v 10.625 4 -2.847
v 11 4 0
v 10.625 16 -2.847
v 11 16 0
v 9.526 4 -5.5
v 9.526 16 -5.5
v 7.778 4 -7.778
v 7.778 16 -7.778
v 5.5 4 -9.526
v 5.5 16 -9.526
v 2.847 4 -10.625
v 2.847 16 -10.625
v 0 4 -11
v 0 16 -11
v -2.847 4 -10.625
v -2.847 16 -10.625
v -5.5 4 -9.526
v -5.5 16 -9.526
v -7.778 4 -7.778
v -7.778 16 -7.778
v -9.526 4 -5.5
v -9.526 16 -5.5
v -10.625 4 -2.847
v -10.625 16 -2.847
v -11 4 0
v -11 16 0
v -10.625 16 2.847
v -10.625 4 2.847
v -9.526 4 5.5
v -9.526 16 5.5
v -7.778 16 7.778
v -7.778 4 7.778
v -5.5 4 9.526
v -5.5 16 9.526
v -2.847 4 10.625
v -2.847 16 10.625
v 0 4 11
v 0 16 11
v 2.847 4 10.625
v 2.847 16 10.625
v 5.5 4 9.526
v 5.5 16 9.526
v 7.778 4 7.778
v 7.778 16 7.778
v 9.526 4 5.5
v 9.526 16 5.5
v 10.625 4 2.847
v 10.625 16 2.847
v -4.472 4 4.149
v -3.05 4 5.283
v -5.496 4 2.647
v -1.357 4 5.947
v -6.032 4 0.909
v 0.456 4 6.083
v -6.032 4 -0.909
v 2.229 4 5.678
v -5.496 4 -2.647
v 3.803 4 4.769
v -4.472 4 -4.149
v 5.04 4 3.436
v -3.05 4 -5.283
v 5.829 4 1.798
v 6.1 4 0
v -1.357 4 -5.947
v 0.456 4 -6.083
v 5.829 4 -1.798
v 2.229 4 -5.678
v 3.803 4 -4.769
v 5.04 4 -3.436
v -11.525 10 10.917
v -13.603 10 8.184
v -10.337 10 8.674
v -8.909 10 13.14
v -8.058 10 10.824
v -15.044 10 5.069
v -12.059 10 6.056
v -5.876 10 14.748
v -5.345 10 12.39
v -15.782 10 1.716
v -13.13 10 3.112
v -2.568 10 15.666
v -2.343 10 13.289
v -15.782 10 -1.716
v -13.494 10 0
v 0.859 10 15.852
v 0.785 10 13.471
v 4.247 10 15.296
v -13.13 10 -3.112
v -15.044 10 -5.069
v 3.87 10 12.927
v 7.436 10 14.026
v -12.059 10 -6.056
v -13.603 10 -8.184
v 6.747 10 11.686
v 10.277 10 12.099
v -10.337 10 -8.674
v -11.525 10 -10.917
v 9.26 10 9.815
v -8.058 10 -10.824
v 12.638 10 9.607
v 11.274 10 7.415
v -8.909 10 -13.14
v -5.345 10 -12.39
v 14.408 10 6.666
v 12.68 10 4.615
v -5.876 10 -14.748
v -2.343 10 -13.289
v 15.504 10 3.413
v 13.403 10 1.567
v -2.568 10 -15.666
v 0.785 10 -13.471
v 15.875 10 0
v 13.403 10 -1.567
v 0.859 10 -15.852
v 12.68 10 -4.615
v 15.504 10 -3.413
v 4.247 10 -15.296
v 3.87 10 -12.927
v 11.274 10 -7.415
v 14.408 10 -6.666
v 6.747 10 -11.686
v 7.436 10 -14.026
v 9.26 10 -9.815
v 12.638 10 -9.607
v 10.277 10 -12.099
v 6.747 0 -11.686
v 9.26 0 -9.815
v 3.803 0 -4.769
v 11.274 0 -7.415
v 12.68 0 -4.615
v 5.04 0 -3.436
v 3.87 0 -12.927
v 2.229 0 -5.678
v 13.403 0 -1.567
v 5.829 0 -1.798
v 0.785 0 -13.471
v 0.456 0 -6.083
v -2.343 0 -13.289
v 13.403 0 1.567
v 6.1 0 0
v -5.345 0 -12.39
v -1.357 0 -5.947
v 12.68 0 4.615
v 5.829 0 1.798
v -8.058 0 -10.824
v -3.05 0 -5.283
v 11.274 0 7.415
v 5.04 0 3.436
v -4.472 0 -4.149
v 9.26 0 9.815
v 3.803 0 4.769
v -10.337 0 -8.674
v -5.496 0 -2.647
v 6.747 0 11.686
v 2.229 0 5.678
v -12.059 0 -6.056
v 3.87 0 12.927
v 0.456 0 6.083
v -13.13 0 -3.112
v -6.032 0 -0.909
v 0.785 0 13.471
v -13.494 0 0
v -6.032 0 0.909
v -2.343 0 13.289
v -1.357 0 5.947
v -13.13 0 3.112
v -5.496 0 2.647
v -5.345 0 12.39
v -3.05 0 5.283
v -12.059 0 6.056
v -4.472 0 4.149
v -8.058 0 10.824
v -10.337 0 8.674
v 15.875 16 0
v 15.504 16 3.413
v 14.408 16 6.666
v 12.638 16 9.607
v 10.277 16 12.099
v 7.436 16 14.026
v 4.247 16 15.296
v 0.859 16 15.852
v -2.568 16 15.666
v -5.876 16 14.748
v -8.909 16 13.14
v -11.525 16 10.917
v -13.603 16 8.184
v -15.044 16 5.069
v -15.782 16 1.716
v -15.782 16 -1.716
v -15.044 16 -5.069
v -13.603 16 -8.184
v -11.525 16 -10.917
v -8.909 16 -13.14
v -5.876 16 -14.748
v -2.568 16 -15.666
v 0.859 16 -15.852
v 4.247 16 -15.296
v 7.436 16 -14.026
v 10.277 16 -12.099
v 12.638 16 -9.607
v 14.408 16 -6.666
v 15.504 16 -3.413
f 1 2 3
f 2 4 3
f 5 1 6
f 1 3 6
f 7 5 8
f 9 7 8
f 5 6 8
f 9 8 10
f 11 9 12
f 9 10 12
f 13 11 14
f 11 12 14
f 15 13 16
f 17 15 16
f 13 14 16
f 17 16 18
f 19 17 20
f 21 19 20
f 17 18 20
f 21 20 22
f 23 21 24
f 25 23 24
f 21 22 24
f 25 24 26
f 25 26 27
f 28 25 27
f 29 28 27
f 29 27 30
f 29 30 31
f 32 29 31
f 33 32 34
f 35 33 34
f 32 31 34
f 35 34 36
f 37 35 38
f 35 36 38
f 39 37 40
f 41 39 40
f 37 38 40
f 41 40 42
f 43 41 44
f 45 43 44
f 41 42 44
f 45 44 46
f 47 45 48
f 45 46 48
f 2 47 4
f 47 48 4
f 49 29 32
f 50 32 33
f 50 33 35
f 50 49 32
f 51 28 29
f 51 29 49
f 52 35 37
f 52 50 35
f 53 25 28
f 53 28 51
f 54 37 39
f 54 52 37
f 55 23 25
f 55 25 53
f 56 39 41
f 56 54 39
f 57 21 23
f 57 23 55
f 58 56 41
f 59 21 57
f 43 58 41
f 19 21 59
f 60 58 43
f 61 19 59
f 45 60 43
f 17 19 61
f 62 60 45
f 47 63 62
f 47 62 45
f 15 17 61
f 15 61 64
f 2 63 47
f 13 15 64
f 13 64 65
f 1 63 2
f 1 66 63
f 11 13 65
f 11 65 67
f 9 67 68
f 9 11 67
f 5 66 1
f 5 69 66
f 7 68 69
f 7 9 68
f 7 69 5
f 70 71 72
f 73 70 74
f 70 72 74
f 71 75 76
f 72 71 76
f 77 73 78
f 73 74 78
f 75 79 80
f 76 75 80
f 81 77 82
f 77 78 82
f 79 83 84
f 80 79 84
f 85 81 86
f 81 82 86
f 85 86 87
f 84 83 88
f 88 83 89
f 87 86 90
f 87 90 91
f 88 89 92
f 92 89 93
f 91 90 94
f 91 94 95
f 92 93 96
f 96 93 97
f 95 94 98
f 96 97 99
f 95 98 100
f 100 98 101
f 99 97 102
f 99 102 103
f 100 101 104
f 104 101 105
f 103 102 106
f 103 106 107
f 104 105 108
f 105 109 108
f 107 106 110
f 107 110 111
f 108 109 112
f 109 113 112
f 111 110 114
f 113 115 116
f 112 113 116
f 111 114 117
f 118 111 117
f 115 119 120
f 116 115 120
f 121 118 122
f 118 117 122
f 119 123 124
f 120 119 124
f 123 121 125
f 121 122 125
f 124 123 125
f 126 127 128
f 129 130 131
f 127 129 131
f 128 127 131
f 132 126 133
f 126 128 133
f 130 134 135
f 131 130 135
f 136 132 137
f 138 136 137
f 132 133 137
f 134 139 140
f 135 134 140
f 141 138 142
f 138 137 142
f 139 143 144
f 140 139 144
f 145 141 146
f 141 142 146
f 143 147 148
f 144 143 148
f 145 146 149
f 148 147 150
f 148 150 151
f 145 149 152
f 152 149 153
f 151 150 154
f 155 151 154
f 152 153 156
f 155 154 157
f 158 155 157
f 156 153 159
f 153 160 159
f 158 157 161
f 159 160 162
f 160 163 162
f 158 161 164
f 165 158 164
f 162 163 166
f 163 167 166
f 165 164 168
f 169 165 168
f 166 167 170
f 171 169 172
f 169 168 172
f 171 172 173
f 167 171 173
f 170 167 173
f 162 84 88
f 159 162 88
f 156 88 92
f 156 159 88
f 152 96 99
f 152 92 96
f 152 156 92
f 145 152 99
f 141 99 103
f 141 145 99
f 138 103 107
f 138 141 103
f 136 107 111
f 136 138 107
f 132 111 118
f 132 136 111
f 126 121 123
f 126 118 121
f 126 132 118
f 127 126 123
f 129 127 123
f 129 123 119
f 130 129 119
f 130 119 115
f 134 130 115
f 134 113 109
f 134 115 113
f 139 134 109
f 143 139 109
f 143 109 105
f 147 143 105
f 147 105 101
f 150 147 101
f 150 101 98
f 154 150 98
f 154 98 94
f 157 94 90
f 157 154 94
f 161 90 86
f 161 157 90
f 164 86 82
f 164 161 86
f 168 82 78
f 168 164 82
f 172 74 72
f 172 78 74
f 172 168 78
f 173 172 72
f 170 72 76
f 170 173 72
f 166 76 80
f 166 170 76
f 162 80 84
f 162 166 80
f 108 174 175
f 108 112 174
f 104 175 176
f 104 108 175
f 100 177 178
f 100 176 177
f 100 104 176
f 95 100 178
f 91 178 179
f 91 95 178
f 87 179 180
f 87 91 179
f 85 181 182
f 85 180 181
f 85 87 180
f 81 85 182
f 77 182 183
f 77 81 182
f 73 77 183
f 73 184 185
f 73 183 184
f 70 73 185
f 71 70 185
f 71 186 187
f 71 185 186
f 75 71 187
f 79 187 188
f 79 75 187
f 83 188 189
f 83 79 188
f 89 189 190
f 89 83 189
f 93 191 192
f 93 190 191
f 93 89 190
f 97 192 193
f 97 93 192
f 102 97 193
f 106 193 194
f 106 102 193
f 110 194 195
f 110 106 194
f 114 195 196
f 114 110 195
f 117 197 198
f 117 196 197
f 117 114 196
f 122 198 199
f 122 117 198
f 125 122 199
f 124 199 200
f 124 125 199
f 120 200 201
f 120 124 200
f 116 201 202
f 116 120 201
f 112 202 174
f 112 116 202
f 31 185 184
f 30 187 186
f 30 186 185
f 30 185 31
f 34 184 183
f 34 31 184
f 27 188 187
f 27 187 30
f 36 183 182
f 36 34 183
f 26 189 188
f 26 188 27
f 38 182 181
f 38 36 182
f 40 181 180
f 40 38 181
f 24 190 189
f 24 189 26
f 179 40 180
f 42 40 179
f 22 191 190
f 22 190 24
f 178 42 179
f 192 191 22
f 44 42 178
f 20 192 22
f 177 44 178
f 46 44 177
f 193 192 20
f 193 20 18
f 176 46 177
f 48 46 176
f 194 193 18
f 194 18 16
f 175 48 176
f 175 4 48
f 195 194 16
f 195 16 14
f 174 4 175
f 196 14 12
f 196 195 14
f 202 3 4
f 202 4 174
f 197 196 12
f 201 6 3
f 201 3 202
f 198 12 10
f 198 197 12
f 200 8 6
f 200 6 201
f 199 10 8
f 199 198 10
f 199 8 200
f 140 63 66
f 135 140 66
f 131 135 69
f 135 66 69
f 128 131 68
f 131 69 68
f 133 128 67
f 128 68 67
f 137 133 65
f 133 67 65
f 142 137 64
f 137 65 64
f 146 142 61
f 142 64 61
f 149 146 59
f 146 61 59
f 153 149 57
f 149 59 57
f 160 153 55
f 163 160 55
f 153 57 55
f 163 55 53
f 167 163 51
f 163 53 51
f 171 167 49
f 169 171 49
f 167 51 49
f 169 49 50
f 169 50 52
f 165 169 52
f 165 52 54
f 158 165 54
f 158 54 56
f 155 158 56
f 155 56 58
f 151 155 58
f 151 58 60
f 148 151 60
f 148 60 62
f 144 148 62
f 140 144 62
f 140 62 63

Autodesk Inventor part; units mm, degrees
ref_plane "YZ Plane" through (0, 0, 0) normal (1, 0, 0) x (0, 1, 0)
ref_plane "XZ Plane" through (0, 0, 0) normal (0, 1, 0) x (-1, 0, 0)
ref_plane "XY Plane" through (0, 0, 0) normal (0, 0, 1) x (1, 0, 0)
sketch "Sketch1" plane through (0, 0, 0) normal (0, 1, 0) x (-1, 0, 0)
  circle A0 centre (0, 0) radius 13.4938
  dimension "d0" = 26.9875
extrude "Extrusion1" add sketch "Sketch1" along normal blind 10
sketch "Sketch2" plane through (0, 10, 0) normal (0, 1, 0) x (1, 0, 0)
  circle A0 centre (0, 0) radius 13.4938 projected
  circle A1 centre (0, 0) radius 15.875
  dimension "d3" = 31.75
extrude "Extrusion2" add sketch "Sketch2" along normal blind 6 contours A0 | A1
sketch "Sketch3" plane through (0, 16, 0) normal (0, 1, 0) x (1, 0, 0)
  circle A0 centre (0, 0) radius 11
  dimension "d6" = 22
extrude "Extrusion3" cut sketch "Sketch3" against normal blind 12
sketch "Sketch4" plane through (0, 4, 0) normal (0, 1, 0) x (1, 0, 0)
  circle A0 centre (0, 0) radius 6.1
  dimension "d9" = 12.2
extrude "Extrusion4" cut sketch "Sketch4" against normal blind 4
properties part number "Switch Cap" material "Polycarbonate, Clear"
